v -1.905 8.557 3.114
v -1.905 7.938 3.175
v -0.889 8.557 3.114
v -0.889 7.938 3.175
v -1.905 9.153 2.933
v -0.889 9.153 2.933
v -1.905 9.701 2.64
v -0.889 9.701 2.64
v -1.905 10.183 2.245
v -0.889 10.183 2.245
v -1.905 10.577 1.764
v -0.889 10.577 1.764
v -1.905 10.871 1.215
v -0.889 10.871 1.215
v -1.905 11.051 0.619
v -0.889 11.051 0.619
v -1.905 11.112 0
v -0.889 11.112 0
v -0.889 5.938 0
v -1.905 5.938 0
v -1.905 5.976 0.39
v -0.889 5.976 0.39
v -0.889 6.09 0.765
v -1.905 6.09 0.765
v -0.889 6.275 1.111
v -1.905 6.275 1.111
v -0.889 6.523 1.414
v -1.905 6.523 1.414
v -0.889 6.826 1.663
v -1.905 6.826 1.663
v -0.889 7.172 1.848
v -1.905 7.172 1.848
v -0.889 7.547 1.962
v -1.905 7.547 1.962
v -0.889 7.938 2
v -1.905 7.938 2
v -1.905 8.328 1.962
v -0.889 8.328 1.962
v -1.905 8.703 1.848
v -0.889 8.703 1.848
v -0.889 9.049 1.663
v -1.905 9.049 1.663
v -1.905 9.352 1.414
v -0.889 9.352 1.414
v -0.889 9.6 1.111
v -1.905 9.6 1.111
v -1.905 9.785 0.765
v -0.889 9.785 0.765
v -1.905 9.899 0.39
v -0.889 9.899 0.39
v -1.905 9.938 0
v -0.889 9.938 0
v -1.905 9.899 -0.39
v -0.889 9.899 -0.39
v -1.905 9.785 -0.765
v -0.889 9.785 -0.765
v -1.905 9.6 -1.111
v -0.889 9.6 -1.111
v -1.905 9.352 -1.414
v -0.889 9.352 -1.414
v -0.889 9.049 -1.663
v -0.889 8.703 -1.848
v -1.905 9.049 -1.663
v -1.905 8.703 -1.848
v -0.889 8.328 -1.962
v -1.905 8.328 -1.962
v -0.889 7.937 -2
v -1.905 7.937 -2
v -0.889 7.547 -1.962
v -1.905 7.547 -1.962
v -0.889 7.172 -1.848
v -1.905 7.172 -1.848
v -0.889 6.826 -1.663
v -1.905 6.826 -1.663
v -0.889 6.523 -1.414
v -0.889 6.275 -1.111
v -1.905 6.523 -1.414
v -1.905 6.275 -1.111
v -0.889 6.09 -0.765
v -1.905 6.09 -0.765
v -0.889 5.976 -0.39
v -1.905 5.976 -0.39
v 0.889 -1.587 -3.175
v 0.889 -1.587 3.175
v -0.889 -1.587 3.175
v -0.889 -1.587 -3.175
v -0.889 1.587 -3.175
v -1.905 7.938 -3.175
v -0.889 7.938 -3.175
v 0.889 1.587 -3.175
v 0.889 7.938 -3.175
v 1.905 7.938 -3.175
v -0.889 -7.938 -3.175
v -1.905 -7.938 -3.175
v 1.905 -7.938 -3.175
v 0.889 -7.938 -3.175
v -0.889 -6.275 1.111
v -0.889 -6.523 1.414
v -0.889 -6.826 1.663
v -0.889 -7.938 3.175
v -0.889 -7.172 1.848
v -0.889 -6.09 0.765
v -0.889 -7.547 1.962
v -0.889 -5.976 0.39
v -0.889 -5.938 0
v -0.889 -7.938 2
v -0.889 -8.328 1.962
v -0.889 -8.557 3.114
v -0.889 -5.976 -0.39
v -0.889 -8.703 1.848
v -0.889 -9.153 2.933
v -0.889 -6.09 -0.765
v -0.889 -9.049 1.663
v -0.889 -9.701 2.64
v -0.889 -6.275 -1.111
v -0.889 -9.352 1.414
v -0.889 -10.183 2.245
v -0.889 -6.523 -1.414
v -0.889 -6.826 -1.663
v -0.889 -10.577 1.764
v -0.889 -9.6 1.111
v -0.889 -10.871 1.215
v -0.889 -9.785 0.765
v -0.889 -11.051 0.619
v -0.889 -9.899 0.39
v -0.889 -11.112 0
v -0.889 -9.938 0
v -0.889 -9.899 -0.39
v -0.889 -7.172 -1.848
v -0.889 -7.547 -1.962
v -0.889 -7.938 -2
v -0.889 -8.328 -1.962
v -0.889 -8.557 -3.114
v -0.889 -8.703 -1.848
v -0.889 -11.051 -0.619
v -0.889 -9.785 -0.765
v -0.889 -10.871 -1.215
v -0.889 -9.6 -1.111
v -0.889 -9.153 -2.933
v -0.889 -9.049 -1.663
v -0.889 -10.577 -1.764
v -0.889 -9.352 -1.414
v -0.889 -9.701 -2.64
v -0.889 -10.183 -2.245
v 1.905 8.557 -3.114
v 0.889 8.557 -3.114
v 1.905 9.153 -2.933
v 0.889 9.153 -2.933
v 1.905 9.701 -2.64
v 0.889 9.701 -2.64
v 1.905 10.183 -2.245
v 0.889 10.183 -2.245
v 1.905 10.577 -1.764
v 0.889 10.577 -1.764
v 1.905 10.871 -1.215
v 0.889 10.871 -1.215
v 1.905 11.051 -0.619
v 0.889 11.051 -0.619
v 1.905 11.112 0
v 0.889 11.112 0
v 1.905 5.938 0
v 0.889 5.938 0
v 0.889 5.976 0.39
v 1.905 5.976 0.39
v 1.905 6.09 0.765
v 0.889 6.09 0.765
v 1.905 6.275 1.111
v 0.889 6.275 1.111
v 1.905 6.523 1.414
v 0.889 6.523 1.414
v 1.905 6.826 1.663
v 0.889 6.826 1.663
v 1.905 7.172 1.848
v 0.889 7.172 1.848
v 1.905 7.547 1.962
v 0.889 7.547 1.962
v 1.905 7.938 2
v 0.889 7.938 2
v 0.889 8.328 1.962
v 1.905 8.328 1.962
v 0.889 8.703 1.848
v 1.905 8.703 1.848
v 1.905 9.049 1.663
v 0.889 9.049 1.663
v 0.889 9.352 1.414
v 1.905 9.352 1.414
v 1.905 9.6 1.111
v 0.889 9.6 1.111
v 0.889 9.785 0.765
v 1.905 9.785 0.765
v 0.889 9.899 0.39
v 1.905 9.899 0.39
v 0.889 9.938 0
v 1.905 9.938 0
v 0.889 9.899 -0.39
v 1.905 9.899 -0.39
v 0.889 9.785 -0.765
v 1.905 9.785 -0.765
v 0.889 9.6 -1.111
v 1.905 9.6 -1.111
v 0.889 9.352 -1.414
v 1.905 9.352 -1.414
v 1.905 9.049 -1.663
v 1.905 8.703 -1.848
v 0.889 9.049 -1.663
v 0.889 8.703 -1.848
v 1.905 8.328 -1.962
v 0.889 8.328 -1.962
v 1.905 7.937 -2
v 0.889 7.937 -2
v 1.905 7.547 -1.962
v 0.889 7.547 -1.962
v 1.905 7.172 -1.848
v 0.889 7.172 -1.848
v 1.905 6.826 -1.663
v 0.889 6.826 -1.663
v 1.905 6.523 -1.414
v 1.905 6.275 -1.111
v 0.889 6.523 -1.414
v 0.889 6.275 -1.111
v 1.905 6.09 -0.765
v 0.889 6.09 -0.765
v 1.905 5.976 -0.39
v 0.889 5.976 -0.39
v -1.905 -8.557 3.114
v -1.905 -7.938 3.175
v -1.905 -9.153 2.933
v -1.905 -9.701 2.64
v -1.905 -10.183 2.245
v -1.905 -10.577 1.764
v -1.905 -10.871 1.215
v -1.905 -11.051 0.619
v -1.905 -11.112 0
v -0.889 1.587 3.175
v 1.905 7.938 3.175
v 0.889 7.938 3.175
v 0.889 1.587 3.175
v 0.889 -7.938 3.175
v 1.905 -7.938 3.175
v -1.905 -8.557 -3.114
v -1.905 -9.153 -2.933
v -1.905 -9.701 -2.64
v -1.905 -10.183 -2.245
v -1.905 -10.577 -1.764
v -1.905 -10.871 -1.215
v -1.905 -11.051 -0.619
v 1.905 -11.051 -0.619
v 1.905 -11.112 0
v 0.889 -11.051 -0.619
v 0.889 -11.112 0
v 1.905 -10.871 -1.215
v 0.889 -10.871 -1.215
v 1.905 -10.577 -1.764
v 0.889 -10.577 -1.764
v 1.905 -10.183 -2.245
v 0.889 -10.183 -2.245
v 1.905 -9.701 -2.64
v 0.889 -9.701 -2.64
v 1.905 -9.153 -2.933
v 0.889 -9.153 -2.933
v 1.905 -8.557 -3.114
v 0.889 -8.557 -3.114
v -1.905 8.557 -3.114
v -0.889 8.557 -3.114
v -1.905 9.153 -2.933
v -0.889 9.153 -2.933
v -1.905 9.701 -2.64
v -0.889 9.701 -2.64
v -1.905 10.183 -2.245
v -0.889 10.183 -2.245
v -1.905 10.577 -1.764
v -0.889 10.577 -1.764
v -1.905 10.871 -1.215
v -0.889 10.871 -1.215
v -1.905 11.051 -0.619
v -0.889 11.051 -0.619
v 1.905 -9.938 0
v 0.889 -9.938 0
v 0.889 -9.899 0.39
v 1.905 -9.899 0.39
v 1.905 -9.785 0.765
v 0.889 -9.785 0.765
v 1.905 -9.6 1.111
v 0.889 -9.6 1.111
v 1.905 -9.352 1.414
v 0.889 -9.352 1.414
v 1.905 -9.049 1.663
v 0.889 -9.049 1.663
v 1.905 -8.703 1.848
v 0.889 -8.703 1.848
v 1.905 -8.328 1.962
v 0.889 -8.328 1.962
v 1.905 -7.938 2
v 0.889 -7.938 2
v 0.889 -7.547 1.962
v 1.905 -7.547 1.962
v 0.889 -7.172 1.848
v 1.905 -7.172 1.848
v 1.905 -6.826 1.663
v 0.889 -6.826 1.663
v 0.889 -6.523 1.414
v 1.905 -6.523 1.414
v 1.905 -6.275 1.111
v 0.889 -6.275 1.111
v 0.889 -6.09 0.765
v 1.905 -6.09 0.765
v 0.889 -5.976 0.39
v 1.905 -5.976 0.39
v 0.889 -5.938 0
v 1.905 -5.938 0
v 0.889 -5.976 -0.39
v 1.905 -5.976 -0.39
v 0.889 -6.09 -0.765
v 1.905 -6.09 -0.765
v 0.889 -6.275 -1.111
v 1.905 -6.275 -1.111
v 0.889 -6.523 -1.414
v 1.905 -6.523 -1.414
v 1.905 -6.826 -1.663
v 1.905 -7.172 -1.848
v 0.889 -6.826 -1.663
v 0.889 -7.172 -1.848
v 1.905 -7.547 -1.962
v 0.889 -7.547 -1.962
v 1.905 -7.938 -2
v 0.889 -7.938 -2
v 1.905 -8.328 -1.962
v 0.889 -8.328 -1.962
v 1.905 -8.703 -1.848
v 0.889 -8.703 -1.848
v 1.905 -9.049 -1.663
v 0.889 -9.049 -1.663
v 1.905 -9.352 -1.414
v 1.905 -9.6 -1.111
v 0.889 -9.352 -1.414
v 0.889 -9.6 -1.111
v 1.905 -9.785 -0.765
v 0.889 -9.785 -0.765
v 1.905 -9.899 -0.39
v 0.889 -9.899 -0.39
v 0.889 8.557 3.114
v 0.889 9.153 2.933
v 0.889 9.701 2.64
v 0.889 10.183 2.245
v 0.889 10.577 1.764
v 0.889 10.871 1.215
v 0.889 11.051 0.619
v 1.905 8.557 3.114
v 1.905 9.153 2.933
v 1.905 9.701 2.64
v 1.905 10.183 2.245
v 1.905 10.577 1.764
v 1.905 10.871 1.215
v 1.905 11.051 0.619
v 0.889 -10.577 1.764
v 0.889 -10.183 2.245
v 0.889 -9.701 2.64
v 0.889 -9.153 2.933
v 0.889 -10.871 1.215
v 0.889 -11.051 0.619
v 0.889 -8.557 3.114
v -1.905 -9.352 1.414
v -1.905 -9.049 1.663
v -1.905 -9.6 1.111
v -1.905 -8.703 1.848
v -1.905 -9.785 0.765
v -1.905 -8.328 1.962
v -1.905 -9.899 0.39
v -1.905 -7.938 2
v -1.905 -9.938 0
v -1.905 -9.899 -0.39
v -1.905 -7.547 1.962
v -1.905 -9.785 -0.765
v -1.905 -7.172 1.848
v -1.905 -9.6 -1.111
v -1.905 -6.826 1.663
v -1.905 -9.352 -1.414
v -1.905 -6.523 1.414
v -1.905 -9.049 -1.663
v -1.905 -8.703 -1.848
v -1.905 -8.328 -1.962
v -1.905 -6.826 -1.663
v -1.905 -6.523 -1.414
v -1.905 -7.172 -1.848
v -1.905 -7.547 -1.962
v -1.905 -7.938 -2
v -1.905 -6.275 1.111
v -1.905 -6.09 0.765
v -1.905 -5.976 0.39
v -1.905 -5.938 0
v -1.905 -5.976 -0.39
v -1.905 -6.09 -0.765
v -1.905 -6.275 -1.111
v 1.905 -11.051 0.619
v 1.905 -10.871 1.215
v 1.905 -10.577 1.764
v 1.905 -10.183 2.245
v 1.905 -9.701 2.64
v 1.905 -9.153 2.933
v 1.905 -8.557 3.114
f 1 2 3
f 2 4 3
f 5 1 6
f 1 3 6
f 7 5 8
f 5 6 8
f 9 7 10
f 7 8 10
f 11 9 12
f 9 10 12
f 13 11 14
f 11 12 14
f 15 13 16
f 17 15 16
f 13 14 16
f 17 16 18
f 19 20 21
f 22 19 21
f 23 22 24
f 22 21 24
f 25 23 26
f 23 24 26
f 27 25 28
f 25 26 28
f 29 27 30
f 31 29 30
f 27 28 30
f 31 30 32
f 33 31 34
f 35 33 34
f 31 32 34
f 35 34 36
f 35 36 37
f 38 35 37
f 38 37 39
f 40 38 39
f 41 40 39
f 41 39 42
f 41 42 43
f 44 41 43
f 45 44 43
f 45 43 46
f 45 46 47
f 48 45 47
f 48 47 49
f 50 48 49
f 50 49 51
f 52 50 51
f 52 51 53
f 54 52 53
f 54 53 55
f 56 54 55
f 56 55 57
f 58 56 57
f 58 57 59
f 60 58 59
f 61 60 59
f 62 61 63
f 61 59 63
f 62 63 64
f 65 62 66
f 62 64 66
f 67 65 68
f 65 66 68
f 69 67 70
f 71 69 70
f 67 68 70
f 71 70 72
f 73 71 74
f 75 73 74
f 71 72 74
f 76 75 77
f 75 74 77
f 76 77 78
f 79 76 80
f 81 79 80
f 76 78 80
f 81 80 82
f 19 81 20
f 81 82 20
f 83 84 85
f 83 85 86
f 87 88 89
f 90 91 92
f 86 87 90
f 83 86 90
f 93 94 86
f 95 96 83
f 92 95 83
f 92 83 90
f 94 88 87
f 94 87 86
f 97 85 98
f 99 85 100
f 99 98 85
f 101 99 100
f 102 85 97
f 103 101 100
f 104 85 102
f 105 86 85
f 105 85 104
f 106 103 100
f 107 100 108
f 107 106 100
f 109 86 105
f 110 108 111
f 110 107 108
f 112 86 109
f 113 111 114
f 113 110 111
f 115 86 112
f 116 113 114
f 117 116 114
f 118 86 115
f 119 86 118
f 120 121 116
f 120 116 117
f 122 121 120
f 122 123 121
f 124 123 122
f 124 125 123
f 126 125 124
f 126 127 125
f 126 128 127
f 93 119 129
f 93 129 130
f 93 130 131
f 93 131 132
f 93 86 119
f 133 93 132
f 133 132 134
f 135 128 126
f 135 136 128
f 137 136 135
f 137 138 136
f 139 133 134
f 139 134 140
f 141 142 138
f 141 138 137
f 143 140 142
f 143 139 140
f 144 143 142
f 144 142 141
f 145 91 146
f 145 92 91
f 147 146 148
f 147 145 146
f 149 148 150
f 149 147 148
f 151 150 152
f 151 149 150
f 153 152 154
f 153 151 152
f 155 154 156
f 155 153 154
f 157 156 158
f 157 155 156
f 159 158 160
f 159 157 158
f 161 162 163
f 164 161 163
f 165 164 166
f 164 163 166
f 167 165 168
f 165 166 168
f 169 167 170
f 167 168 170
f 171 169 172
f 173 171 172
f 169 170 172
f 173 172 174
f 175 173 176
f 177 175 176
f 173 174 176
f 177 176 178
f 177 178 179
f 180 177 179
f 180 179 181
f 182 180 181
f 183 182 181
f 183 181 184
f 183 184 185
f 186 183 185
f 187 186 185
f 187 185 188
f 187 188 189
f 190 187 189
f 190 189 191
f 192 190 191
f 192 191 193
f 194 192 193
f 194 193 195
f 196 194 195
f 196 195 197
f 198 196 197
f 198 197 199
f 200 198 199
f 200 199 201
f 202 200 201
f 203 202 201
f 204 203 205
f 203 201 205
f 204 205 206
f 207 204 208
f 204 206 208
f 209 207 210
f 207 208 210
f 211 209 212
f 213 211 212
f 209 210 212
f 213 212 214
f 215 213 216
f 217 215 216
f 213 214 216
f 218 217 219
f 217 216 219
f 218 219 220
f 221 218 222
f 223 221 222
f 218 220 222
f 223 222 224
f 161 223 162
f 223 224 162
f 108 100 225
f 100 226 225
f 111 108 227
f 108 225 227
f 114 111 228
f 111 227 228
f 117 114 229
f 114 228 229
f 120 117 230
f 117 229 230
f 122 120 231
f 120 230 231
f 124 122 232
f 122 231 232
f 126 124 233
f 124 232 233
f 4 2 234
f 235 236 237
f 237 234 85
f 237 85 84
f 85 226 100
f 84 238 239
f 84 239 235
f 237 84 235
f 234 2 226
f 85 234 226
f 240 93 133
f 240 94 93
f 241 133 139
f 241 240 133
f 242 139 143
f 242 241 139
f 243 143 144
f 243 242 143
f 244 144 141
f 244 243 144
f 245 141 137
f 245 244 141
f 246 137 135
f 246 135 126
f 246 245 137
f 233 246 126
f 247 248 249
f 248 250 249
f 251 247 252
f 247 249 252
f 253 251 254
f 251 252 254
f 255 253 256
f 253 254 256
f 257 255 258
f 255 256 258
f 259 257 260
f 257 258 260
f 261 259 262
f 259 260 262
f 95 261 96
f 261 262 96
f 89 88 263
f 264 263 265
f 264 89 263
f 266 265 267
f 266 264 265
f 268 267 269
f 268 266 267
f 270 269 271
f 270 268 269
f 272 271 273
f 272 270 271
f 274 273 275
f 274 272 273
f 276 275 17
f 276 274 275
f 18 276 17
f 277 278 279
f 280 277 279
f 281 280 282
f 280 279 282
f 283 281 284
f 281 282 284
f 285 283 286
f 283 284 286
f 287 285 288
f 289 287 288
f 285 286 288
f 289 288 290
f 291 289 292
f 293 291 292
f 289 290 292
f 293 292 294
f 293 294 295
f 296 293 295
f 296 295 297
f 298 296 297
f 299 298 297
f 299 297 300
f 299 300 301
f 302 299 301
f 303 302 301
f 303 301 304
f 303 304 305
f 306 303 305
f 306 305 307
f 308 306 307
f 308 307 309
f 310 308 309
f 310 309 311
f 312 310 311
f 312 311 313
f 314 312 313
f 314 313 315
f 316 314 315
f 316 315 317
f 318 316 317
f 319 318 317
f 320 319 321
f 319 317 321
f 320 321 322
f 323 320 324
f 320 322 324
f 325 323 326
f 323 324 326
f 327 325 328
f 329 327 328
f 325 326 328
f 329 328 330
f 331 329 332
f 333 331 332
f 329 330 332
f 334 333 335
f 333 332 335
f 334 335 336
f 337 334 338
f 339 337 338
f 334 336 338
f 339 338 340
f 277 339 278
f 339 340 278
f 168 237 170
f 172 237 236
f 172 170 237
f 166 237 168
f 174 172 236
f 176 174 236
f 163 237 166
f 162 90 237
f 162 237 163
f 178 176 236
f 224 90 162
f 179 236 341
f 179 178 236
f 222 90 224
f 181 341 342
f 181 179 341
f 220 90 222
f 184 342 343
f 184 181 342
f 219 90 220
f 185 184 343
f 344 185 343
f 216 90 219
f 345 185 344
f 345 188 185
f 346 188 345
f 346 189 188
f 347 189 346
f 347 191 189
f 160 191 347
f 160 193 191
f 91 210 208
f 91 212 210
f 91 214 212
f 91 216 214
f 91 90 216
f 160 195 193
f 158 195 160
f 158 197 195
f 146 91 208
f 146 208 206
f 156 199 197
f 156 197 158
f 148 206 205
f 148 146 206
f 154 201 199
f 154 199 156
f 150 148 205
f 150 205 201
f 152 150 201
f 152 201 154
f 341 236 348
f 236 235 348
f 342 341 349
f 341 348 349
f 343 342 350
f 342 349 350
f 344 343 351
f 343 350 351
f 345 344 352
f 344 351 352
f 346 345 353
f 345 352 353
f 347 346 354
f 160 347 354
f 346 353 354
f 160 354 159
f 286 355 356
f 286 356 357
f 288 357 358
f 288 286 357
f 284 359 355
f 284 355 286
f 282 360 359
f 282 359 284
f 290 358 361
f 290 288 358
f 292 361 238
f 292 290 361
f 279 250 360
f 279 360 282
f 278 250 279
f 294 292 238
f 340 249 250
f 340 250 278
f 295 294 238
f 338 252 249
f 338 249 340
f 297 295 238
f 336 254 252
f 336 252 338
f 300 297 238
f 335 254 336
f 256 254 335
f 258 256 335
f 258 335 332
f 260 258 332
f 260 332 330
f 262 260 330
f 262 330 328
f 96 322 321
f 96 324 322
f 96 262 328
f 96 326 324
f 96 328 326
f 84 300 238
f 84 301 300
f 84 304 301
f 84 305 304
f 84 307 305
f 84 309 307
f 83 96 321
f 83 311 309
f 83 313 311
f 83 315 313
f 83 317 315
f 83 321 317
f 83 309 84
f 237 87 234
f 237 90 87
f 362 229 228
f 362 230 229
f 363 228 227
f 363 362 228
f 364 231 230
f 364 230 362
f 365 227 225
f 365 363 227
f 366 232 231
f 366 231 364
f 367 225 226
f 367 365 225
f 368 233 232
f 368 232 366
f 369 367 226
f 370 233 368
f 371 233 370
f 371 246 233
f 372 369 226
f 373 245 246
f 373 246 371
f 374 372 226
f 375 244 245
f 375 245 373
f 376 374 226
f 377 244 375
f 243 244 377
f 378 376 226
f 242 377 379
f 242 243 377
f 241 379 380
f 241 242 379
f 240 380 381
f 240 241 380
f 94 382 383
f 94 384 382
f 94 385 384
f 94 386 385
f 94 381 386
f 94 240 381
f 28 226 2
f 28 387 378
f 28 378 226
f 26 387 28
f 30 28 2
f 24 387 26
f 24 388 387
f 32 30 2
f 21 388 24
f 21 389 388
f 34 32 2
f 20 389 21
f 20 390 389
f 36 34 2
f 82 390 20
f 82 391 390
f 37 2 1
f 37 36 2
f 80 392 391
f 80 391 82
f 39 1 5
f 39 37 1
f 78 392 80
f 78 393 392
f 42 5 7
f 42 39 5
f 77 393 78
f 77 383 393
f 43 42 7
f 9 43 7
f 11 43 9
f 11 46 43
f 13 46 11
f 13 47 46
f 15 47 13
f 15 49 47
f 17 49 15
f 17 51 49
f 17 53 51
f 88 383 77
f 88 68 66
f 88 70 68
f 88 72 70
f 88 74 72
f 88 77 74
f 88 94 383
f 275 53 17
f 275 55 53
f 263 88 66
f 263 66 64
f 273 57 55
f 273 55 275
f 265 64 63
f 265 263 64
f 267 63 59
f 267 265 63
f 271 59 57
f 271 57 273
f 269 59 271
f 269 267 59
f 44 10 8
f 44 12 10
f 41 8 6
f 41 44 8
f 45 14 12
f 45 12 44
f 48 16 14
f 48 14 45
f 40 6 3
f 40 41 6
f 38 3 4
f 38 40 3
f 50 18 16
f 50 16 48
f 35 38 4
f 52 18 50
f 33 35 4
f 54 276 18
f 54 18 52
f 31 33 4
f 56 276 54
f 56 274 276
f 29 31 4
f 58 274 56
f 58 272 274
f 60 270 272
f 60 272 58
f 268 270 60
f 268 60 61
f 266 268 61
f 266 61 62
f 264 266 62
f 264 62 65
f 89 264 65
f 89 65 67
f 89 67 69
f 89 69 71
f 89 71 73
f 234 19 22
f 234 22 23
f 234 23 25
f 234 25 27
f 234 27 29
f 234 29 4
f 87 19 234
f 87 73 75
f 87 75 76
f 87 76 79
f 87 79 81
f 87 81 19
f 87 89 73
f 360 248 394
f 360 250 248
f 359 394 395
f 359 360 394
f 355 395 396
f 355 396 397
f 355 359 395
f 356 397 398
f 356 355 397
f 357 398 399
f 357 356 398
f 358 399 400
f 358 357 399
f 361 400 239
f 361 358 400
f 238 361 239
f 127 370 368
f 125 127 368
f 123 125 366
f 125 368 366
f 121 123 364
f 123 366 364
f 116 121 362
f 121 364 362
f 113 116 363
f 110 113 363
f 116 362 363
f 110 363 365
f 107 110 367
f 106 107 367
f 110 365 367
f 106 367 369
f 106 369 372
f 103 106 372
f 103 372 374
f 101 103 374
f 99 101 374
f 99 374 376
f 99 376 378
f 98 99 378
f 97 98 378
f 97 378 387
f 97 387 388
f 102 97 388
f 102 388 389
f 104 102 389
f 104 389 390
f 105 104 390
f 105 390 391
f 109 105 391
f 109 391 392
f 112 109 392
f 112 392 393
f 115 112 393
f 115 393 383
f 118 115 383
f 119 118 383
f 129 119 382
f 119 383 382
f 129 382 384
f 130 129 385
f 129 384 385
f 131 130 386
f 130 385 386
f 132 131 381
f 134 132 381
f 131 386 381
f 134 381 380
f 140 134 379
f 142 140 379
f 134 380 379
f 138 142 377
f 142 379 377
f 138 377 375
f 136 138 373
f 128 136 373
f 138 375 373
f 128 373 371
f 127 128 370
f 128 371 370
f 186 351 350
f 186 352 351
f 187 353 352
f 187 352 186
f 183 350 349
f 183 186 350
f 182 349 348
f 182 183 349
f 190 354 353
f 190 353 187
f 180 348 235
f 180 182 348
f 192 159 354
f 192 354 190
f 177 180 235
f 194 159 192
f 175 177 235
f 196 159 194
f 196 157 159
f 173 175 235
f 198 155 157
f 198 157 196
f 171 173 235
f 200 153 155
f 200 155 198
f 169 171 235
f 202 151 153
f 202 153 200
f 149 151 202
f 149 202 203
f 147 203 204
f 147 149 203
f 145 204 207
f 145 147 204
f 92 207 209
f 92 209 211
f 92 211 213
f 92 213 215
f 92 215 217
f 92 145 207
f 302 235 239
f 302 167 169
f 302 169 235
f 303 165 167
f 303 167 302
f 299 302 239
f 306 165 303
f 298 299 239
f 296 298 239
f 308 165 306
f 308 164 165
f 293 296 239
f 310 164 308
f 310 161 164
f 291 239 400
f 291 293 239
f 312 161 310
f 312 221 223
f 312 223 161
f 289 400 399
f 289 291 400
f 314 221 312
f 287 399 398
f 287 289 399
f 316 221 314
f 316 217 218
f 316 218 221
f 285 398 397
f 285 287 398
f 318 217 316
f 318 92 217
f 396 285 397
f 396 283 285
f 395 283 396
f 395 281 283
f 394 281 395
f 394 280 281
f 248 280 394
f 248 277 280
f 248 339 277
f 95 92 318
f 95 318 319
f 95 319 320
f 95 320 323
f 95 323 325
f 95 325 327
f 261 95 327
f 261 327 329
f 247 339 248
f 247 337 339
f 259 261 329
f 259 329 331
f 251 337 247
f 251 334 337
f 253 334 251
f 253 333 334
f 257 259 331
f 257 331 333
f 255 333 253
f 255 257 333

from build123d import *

# Parameters (mm, degrees)
F1_DEPTH   = 0.889
F3_DEPTH   = 6.35
F4_R       = 3.17499
F7_D       = 4
F7_ON_F6_D = 4


# Not quite as in the source:
# - a fillet or chamfer is up to 0.001 mm smaller than in the source, because OpenCascade refuses the exact size
# - a feature names something its author has since deleted; it is built from what else it names


with BuildPart() as f1:
    # F0 (on Right) → F1 (new body, symmetric)
    with BuildSketch(Plane.YZ):
        Polygon((1.5875, 3.175), (-1.5875, 3.175), (-1.5875, 0), (0, 0), (1.5875, 0), align=None)
        Polygon((0, 0), (-1.5875, 0), (-1.5875, -3.175), (1.5875, -3.175), (1.5875, 0), align=None)
    extrude(amount=F1_DEPTH, both=True)

    # F2 (on face) → F3 (join)
    with BuildSketch(Plane(origin=(0, 0, -3.175), x_dir=(1, 0, 0), z_dir=(0, 0, -1))):
        Polygon((0.889, 0), (1.905, 0), (1.905, 11.1125), (0.889, 11.1125), (0.889, 1.5875), (-0.889, 1.5875), (-0.889, 11.1125), (-1.905, 11.1125), (-1.905, 0), (-0.889, 0), (0, 0), align=None)
        Polygon((1.905, -11.1125), (1.905, 0), (0.889, 0), (0, 0), (-0.889, 0), (-1.905, 0), (-1.905, -11.1125), (-0.889, -11.1125), (-0.889, -1.5875), (0.889, -1.5875), (0.889, -11.1125), align=None)
    extrude(amount=-F3_DEPTH)

    # F4 (radius 3.175 in the source; OpenCascade refuses exactly that, so slightly less here)
    f4_edges = [f1.edges().sort_by_distance(p)[0] for p in [
        (1.397, -11.1125, 3.175),
        (-1.397, -11.1125, 3.175),
        (1.397, -11.1125, -3.175),
        (-1.397, -11.1125, -3.175),
        (-1.397, 11.1125, -3.175),
        (1.397, 11.1125, -3.175),
        (1.397, 11.1125, 3.175),
        (-1.397, 11.1125, 3.175),
    ]]
    fillet(f4_edges, radius=F4_R)

    # F7 (through all)
    with Locations(Plane.YZ.offset(1.905)):
        with Locations((-7.9375, 0)):
            Hole(F7_D / 2)

    # F7 on F6 (through all)
    with Locations(Plane.YZ.offset(1.905)):
        with Locations((7.9375, 0)):
            Hole(F7_ON_F6_D / 2)


solid = f1.part
